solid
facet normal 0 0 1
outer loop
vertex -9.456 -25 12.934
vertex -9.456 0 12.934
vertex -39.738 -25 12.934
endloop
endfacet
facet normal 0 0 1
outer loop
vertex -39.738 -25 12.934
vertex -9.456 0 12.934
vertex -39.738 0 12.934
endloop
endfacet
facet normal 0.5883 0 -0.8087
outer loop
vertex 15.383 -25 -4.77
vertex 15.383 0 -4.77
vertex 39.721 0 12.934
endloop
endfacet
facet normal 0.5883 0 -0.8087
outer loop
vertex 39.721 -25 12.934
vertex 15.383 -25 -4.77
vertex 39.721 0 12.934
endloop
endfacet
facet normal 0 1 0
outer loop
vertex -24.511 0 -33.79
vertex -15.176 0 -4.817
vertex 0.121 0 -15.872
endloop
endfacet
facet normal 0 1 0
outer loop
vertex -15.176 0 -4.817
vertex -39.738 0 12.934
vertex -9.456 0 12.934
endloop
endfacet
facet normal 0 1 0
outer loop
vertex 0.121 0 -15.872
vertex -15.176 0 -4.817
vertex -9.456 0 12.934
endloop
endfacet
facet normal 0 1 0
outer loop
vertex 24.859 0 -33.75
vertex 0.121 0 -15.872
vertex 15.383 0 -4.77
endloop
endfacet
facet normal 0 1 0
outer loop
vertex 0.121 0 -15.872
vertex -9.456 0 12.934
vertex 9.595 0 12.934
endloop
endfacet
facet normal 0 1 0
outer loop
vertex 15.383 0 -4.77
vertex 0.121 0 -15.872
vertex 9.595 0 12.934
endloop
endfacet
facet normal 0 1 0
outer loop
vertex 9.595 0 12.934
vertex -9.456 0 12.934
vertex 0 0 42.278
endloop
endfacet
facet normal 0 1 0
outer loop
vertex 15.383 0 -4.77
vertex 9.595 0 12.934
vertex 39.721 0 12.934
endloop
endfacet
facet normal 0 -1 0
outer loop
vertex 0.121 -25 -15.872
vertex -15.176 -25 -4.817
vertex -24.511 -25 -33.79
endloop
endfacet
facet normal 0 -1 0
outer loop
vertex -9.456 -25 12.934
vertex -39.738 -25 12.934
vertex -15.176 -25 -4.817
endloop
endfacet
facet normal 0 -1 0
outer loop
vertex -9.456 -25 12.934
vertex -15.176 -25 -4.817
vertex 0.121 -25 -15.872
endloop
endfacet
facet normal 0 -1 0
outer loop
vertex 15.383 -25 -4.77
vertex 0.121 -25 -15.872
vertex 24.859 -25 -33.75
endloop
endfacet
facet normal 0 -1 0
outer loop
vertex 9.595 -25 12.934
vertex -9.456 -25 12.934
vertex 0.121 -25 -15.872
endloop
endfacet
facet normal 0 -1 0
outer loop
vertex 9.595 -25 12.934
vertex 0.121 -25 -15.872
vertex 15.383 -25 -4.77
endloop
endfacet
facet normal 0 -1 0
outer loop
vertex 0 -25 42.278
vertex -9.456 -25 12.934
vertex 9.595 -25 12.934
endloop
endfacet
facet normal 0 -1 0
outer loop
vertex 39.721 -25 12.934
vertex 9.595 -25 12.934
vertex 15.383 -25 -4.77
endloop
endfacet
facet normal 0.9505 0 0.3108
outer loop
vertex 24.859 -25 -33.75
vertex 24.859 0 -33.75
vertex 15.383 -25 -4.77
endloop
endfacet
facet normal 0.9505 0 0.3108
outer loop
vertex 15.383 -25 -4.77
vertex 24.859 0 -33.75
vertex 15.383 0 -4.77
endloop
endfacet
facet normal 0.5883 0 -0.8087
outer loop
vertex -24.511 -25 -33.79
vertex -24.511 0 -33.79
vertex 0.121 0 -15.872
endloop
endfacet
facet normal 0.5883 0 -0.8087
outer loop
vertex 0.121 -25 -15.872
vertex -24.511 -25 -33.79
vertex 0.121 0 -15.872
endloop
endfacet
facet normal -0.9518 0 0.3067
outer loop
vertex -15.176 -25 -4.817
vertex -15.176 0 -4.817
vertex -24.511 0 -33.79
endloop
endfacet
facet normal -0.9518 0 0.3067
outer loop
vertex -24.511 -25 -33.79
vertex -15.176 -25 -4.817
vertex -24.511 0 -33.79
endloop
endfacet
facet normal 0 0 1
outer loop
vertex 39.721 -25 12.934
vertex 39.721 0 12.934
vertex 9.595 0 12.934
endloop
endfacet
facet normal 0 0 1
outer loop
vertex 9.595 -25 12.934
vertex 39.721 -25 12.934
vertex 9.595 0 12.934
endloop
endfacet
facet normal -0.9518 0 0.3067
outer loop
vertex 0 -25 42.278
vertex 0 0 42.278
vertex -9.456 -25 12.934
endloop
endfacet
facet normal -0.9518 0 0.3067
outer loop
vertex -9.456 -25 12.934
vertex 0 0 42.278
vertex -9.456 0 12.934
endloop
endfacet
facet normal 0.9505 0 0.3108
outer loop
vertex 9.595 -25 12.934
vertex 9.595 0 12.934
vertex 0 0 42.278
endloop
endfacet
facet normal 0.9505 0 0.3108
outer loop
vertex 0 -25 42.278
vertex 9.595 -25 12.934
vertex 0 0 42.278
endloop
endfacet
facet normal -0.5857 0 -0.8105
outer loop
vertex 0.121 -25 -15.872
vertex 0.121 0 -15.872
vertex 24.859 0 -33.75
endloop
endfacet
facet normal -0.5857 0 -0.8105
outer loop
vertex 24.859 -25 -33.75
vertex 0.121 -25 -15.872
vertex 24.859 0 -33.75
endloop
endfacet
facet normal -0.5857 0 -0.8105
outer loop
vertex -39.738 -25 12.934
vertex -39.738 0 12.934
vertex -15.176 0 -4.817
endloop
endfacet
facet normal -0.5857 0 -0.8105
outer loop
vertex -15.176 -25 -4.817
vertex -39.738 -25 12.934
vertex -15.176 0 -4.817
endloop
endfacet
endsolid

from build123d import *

# Parameters (mm, degrees)
F2_DEPTH = 25


with BuildPart() as f2:
    # F1 (on face) → F2 (new body)
    with BuildSketch(Plane.XZ):
        Polygon((9.5947289367, 12.933765538), (0, 42.278226465), (-9.4556037773, 12.933765538), align=None)
        Polygon((9.5947289367, 12.933765538), (-9.4556037773, 12.933765538), (-15.1755097815, -4.8173545596), (0.1207542754, -15.8718874525), (15.3832069723, -4.7696806626), align=None)
        Polygon((-15.1755097815, -4.8173545596), (-9.4556037773, 12.933765538), (-39.737906307, 12.933765538), align=None)
        Polygon((39.720531553, 12.933765538), (9.5947289367, 12.933765538), (15.3832069723, -4.7696806626), align=None)
        Polygon((0.1207542754, -15.8718874525), (-15.1755097815, -4.8173545596), (-24.5111901313, -33.7896458805), align=None)
        Polygon((24.8588733375, -33.7500013411), (15.3832069723, -4.7696806626), (0.1207542754, -15.8718874525), align=None)
    extrude(amount=F2_DEPTH)


solid = f2.part
